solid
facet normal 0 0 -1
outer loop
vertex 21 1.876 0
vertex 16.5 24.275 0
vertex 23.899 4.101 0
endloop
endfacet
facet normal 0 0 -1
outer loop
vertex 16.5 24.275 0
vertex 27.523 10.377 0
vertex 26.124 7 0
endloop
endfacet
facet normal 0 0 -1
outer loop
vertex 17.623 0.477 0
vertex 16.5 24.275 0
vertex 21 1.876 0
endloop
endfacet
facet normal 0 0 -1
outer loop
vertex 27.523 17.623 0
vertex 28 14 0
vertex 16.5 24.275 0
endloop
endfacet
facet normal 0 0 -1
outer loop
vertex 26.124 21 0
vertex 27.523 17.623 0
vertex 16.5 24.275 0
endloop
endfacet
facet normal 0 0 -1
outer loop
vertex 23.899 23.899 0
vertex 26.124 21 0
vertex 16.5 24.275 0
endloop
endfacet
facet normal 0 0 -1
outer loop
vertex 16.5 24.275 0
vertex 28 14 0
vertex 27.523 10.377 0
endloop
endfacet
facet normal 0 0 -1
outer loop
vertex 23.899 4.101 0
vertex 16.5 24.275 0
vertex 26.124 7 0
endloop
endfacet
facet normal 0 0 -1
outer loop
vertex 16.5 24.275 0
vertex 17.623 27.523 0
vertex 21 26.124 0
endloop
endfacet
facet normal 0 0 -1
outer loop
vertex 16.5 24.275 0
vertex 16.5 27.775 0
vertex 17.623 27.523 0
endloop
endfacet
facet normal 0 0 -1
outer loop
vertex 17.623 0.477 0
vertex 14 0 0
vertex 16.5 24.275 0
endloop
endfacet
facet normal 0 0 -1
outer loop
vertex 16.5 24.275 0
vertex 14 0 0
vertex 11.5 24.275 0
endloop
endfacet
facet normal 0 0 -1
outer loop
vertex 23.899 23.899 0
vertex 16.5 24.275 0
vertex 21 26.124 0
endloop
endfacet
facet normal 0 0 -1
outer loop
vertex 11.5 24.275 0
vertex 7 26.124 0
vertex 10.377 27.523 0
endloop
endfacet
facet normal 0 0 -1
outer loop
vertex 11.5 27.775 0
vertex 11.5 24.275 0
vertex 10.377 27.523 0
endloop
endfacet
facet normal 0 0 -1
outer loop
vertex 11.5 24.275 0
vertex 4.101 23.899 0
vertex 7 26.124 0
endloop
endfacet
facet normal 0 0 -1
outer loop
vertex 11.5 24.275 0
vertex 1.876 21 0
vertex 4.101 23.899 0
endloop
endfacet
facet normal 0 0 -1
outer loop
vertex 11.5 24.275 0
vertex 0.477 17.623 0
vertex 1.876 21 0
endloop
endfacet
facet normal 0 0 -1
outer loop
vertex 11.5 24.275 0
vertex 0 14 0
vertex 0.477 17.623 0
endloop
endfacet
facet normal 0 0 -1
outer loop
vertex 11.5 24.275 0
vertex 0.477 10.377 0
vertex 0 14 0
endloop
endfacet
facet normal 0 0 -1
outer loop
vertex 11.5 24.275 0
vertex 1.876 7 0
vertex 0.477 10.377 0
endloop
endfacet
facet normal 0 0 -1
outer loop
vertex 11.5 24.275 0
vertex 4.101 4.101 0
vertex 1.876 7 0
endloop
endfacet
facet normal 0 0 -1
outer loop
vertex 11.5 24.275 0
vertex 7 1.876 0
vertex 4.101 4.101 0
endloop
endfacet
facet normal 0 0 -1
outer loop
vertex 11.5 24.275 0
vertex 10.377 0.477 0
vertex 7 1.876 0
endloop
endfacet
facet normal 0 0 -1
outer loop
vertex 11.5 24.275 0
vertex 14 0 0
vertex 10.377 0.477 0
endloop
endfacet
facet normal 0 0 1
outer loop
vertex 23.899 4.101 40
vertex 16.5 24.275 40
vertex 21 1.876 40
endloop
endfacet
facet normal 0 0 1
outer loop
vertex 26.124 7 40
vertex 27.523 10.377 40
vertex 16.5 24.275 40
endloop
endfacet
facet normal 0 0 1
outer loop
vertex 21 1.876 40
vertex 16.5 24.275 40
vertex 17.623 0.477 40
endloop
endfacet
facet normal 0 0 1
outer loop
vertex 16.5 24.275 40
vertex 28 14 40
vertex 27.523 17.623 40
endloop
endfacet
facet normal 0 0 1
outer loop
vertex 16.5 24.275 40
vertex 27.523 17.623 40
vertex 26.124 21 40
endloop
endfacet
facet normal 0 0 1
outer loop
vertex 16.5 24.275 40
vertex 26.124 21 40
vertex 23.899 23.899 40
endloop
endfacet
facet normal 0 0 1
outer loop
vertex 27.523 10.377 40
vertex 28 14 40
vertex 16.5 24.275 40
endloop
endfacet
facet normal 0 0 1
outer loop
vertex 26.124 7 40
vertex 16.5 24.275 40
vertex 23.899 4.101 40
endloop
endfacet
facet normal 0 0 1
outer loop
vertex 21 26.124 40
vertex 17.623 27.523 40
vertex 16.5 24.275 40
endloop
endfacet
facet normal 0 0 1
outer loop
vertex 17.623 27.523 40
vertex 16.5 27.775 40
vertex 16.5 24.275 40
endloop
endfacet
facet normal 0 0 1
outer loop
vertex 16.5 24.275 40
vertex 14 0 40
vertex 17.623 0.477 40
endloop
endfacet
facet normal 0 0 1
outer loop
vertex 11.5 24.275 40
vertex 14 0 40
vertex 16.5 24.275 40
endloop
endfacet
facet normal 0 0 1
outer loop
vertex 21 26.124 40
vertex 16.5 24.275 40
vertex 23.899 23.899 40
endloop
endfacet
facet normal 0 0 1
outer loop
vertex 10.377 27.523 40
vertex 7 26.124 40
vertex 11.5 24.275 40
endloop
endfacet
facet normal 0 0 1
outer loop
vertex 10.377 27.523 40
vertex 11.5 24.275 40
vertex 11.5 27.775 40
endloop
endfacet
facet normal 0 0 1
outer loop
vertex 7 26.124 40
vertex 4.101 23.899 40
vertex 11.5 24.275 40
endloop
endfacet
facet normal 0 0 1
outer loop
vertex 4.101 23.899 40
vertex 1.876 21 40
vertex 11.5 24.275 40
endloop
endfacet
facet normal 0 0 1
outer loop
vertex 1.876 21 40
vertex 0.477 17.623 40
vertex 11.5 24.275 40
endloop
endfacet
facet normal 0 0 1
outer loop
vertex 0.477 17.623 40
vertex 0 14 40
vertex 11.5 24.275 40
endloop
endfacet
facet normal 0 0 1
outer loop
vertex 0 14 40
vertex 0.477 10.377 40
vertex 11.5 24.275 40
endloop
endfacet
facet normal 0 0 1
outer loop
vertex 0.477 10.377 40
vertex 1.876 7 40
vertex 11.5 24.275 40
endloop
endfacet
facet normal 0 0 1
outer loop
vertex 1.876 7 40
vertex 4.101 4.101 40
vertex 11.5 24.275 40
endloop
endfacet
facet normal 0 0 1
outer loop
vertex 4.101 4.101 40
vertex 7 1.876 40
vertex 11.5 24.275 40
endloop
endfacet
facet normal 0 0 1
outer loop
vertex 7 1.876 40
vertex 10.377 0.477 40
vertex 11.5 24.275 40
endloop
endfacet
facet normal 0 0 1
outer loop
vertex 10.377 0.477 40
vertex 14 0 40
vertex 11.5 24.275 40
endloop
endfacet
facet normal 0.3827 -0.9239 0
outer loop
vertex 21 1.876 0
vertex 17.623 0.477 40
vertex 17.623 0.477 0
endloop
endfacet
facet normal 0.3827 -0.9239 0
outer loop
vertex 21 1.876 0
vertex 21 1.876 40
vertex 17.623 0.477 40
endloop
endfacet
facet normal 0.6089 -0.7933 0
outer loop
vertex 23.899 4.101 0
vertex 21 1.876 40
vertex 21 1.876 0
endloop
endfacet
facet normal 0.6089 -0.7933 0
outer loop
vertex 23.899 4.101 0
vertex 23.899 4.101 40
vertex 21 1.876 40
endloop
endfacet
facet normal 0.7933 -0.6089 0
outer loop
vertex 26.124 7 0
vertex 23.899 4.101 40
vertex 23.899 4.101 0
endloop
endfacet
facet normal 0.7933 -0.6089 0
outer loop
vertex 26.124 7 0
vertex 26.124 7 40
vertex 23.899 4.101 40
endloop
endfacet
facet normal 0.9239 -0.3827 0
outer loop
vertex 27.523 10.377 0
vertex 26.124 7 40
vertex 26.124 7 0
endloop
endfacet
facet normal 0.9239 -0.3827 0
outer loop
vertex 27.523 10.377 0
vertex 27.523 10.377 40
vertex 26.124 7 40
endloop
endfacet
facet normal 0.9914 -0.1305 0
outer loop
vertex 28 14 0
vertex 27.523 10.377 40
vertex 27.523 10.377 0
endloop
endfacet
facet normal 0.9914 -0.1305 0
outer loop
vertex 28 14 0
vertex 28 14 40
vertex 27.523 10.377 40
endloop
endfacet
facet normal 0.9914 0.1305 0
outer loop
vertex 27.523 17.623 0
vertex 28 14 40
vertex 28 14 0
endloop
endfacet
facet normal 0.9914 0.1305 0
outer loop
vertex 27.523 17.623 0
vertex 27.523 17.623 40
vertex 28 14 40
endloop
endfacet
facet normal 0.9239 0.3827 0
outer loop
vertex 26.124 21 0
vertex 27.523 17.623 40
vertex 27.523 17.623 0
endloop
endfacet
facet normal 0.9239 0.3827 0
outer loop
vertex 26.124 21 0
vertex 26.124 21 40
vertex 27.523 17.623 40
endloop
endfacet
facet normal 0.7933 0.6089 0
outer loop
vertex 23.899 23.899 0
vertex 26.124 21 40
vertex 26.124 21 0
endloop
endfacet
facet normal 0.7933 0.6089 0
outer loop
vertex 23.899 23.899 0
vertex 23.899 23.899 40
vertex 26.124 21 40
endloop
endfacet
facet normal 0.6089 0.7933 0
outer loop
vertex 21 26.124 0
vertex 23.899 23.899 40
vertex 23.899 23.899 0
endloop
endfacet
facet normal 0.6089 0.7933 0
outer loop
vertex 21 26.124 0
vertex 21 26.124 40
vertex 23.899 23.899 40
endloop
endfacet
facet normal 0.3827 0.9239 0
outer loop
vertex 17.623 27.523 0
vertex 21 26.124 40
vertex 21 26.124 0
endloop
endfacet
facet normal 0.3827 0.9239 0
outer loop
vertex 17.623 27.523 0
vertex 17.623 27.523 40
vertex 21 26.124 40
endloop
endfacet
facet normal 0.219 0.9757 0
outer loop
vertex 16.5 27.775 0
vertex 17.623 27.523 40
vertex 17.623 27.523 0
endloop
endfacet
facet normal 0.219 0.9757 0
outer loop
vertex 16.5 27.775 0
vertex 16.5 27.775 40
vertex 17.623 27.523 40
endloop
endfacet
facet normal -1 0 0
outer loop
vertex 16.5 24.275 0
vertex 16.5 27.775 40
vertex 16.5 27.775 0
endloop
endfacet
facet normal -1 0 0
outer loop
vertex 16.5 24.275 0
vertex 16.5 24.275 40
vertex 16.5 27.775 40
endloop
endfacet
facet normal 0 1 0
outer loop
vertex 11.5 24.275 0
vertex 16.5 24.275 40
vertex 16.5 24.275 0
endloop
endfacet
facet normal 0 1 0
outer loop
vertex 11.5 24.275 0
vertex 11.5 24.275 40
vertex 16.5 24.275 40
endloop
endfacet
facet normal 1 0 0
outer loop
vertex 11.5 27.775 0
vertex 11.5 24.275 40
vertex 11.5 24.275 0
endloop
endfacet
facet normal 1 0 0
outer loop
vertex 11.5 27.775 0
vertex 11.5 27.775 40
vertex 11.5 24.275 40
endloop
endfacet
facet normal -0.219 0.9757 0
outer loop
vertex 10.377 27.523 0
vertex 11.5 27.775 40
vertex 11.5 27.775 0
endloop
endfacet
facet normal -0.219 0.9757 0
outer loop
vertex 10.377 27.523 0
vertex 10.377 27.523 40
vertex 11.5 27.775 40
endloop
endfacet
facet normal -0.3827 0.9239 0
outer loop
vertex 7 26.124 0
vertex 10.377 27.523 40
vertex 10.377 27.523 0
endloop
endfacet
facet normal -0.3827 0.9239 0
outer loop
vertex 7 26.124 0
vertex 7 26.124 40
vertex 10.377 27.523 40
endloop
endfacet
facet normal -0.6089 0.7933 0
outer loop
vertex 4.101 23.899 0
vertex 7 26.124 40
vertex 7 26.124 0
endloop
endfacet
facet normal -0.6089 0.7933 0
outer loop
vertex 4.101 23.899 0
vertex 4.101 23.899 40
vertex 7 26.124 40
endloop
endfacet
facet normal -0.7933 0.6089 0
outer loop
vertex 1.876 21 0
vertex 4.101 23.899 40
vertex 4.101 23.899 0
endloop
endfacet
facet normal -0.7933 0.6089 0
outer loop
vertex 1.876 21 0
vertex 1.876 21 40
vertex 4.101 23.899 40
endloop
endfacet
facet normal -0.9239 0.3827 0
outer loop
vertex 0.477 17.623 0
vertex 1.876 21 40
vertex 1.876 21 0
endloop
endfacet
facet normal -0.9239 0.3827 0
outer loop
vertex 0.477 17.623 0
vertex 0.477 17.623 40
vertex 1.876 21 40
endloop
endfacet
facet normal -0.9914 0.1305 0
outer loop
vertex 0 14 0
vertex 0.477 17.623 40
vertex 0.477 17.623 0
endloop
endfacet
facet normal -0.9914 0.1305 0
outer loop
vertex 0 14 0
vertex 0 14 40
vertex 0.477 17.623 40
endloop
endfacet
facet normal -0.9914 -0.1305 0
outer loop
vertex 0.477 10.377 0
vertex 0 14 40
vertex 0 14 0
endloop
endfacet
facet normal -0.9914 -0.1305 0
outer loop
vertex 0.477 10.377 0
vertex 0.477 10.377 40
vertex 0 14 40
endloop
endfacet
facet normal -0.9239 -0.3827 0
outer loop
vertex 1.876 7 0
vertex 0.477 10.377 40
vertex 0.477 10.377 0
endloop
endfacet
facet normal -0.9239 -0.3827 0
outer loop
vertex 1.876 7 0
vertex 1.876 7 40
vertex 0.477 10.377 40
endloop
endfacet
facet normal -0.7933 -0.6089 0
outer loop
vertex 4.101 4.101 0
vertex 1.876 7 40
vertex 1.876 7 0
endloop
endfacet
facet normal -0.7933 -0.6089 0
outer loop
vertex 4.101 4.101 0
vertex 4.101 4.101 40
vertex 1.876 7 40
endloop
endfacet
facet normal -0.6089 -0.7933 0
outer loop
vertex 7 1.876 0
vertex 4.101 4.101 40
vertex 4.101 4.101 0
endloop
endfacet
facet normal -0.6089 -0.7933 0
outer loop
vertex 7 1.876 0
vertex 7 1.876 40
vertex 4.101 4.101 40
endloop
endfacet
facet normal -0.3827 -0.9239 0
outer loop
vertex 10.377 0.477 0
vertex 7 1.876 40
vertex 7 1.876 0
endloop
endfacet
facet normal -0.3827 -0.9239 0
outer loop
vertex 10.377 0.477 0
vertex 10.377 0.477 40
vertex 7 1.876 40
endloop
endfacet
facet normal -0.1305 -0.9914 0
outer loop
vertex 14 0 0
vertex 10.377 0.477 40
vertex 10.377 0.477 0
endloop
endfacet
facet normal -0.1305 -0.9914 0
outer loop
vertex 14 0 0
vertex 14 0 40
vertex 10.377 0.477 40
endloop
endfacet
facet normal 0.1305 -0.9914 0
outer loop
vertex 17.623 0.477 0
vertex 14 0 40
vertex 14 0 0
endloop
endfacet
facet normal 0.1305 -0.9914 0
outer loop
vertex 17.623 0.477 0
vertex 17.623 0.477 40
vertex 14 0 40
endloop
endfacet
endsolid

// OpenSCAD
$fn = 32;

// ----------------------------------------------------------------------
// Keyway shaft: d28 shaft, key 5 x 3.5 mm
// ----------------------------------------------------------------------

// --- parameters (mm) ---
shaft_r = 14;             // shaft radius
key_w = 5;                // keyway width
key_d = 3.5;              // keyway depth below the surface line
plate_t = 40;             // shaft length, Z (extrusion height)

shaft_d = 2 * shaft_r;  // shaft diameter
circle_step = 15;  // polygon sampling step, degrees

profile = [[10.377, 27.523], [7, 26.124], [4.101, 23.899], [1.876, 21], [0.477, 17.623], [0, 14], [0.477, 10.377], [1.876, 7], [4.101, 4.101], [7, 1.876], [10.377, 0.477], [14, 0], [17.623, 0.477], [21, 1.876], [23.899, 4.101], [26.124, 7], [27.523, 10.377], [28, 14], [27.523, 17.623], [26.124, 21], [23.899, 23.899], [21, 26.124], [17.623, 27.523], [16.5, 27.775], [16.5, 24.275], [11.5, 24.275], [11.5, 27.775]];  // primary outline, 27 points, counter clockwise

// --- the one profile operation ---
linear_extrude(height = plate_t) polygon(points = profile);
